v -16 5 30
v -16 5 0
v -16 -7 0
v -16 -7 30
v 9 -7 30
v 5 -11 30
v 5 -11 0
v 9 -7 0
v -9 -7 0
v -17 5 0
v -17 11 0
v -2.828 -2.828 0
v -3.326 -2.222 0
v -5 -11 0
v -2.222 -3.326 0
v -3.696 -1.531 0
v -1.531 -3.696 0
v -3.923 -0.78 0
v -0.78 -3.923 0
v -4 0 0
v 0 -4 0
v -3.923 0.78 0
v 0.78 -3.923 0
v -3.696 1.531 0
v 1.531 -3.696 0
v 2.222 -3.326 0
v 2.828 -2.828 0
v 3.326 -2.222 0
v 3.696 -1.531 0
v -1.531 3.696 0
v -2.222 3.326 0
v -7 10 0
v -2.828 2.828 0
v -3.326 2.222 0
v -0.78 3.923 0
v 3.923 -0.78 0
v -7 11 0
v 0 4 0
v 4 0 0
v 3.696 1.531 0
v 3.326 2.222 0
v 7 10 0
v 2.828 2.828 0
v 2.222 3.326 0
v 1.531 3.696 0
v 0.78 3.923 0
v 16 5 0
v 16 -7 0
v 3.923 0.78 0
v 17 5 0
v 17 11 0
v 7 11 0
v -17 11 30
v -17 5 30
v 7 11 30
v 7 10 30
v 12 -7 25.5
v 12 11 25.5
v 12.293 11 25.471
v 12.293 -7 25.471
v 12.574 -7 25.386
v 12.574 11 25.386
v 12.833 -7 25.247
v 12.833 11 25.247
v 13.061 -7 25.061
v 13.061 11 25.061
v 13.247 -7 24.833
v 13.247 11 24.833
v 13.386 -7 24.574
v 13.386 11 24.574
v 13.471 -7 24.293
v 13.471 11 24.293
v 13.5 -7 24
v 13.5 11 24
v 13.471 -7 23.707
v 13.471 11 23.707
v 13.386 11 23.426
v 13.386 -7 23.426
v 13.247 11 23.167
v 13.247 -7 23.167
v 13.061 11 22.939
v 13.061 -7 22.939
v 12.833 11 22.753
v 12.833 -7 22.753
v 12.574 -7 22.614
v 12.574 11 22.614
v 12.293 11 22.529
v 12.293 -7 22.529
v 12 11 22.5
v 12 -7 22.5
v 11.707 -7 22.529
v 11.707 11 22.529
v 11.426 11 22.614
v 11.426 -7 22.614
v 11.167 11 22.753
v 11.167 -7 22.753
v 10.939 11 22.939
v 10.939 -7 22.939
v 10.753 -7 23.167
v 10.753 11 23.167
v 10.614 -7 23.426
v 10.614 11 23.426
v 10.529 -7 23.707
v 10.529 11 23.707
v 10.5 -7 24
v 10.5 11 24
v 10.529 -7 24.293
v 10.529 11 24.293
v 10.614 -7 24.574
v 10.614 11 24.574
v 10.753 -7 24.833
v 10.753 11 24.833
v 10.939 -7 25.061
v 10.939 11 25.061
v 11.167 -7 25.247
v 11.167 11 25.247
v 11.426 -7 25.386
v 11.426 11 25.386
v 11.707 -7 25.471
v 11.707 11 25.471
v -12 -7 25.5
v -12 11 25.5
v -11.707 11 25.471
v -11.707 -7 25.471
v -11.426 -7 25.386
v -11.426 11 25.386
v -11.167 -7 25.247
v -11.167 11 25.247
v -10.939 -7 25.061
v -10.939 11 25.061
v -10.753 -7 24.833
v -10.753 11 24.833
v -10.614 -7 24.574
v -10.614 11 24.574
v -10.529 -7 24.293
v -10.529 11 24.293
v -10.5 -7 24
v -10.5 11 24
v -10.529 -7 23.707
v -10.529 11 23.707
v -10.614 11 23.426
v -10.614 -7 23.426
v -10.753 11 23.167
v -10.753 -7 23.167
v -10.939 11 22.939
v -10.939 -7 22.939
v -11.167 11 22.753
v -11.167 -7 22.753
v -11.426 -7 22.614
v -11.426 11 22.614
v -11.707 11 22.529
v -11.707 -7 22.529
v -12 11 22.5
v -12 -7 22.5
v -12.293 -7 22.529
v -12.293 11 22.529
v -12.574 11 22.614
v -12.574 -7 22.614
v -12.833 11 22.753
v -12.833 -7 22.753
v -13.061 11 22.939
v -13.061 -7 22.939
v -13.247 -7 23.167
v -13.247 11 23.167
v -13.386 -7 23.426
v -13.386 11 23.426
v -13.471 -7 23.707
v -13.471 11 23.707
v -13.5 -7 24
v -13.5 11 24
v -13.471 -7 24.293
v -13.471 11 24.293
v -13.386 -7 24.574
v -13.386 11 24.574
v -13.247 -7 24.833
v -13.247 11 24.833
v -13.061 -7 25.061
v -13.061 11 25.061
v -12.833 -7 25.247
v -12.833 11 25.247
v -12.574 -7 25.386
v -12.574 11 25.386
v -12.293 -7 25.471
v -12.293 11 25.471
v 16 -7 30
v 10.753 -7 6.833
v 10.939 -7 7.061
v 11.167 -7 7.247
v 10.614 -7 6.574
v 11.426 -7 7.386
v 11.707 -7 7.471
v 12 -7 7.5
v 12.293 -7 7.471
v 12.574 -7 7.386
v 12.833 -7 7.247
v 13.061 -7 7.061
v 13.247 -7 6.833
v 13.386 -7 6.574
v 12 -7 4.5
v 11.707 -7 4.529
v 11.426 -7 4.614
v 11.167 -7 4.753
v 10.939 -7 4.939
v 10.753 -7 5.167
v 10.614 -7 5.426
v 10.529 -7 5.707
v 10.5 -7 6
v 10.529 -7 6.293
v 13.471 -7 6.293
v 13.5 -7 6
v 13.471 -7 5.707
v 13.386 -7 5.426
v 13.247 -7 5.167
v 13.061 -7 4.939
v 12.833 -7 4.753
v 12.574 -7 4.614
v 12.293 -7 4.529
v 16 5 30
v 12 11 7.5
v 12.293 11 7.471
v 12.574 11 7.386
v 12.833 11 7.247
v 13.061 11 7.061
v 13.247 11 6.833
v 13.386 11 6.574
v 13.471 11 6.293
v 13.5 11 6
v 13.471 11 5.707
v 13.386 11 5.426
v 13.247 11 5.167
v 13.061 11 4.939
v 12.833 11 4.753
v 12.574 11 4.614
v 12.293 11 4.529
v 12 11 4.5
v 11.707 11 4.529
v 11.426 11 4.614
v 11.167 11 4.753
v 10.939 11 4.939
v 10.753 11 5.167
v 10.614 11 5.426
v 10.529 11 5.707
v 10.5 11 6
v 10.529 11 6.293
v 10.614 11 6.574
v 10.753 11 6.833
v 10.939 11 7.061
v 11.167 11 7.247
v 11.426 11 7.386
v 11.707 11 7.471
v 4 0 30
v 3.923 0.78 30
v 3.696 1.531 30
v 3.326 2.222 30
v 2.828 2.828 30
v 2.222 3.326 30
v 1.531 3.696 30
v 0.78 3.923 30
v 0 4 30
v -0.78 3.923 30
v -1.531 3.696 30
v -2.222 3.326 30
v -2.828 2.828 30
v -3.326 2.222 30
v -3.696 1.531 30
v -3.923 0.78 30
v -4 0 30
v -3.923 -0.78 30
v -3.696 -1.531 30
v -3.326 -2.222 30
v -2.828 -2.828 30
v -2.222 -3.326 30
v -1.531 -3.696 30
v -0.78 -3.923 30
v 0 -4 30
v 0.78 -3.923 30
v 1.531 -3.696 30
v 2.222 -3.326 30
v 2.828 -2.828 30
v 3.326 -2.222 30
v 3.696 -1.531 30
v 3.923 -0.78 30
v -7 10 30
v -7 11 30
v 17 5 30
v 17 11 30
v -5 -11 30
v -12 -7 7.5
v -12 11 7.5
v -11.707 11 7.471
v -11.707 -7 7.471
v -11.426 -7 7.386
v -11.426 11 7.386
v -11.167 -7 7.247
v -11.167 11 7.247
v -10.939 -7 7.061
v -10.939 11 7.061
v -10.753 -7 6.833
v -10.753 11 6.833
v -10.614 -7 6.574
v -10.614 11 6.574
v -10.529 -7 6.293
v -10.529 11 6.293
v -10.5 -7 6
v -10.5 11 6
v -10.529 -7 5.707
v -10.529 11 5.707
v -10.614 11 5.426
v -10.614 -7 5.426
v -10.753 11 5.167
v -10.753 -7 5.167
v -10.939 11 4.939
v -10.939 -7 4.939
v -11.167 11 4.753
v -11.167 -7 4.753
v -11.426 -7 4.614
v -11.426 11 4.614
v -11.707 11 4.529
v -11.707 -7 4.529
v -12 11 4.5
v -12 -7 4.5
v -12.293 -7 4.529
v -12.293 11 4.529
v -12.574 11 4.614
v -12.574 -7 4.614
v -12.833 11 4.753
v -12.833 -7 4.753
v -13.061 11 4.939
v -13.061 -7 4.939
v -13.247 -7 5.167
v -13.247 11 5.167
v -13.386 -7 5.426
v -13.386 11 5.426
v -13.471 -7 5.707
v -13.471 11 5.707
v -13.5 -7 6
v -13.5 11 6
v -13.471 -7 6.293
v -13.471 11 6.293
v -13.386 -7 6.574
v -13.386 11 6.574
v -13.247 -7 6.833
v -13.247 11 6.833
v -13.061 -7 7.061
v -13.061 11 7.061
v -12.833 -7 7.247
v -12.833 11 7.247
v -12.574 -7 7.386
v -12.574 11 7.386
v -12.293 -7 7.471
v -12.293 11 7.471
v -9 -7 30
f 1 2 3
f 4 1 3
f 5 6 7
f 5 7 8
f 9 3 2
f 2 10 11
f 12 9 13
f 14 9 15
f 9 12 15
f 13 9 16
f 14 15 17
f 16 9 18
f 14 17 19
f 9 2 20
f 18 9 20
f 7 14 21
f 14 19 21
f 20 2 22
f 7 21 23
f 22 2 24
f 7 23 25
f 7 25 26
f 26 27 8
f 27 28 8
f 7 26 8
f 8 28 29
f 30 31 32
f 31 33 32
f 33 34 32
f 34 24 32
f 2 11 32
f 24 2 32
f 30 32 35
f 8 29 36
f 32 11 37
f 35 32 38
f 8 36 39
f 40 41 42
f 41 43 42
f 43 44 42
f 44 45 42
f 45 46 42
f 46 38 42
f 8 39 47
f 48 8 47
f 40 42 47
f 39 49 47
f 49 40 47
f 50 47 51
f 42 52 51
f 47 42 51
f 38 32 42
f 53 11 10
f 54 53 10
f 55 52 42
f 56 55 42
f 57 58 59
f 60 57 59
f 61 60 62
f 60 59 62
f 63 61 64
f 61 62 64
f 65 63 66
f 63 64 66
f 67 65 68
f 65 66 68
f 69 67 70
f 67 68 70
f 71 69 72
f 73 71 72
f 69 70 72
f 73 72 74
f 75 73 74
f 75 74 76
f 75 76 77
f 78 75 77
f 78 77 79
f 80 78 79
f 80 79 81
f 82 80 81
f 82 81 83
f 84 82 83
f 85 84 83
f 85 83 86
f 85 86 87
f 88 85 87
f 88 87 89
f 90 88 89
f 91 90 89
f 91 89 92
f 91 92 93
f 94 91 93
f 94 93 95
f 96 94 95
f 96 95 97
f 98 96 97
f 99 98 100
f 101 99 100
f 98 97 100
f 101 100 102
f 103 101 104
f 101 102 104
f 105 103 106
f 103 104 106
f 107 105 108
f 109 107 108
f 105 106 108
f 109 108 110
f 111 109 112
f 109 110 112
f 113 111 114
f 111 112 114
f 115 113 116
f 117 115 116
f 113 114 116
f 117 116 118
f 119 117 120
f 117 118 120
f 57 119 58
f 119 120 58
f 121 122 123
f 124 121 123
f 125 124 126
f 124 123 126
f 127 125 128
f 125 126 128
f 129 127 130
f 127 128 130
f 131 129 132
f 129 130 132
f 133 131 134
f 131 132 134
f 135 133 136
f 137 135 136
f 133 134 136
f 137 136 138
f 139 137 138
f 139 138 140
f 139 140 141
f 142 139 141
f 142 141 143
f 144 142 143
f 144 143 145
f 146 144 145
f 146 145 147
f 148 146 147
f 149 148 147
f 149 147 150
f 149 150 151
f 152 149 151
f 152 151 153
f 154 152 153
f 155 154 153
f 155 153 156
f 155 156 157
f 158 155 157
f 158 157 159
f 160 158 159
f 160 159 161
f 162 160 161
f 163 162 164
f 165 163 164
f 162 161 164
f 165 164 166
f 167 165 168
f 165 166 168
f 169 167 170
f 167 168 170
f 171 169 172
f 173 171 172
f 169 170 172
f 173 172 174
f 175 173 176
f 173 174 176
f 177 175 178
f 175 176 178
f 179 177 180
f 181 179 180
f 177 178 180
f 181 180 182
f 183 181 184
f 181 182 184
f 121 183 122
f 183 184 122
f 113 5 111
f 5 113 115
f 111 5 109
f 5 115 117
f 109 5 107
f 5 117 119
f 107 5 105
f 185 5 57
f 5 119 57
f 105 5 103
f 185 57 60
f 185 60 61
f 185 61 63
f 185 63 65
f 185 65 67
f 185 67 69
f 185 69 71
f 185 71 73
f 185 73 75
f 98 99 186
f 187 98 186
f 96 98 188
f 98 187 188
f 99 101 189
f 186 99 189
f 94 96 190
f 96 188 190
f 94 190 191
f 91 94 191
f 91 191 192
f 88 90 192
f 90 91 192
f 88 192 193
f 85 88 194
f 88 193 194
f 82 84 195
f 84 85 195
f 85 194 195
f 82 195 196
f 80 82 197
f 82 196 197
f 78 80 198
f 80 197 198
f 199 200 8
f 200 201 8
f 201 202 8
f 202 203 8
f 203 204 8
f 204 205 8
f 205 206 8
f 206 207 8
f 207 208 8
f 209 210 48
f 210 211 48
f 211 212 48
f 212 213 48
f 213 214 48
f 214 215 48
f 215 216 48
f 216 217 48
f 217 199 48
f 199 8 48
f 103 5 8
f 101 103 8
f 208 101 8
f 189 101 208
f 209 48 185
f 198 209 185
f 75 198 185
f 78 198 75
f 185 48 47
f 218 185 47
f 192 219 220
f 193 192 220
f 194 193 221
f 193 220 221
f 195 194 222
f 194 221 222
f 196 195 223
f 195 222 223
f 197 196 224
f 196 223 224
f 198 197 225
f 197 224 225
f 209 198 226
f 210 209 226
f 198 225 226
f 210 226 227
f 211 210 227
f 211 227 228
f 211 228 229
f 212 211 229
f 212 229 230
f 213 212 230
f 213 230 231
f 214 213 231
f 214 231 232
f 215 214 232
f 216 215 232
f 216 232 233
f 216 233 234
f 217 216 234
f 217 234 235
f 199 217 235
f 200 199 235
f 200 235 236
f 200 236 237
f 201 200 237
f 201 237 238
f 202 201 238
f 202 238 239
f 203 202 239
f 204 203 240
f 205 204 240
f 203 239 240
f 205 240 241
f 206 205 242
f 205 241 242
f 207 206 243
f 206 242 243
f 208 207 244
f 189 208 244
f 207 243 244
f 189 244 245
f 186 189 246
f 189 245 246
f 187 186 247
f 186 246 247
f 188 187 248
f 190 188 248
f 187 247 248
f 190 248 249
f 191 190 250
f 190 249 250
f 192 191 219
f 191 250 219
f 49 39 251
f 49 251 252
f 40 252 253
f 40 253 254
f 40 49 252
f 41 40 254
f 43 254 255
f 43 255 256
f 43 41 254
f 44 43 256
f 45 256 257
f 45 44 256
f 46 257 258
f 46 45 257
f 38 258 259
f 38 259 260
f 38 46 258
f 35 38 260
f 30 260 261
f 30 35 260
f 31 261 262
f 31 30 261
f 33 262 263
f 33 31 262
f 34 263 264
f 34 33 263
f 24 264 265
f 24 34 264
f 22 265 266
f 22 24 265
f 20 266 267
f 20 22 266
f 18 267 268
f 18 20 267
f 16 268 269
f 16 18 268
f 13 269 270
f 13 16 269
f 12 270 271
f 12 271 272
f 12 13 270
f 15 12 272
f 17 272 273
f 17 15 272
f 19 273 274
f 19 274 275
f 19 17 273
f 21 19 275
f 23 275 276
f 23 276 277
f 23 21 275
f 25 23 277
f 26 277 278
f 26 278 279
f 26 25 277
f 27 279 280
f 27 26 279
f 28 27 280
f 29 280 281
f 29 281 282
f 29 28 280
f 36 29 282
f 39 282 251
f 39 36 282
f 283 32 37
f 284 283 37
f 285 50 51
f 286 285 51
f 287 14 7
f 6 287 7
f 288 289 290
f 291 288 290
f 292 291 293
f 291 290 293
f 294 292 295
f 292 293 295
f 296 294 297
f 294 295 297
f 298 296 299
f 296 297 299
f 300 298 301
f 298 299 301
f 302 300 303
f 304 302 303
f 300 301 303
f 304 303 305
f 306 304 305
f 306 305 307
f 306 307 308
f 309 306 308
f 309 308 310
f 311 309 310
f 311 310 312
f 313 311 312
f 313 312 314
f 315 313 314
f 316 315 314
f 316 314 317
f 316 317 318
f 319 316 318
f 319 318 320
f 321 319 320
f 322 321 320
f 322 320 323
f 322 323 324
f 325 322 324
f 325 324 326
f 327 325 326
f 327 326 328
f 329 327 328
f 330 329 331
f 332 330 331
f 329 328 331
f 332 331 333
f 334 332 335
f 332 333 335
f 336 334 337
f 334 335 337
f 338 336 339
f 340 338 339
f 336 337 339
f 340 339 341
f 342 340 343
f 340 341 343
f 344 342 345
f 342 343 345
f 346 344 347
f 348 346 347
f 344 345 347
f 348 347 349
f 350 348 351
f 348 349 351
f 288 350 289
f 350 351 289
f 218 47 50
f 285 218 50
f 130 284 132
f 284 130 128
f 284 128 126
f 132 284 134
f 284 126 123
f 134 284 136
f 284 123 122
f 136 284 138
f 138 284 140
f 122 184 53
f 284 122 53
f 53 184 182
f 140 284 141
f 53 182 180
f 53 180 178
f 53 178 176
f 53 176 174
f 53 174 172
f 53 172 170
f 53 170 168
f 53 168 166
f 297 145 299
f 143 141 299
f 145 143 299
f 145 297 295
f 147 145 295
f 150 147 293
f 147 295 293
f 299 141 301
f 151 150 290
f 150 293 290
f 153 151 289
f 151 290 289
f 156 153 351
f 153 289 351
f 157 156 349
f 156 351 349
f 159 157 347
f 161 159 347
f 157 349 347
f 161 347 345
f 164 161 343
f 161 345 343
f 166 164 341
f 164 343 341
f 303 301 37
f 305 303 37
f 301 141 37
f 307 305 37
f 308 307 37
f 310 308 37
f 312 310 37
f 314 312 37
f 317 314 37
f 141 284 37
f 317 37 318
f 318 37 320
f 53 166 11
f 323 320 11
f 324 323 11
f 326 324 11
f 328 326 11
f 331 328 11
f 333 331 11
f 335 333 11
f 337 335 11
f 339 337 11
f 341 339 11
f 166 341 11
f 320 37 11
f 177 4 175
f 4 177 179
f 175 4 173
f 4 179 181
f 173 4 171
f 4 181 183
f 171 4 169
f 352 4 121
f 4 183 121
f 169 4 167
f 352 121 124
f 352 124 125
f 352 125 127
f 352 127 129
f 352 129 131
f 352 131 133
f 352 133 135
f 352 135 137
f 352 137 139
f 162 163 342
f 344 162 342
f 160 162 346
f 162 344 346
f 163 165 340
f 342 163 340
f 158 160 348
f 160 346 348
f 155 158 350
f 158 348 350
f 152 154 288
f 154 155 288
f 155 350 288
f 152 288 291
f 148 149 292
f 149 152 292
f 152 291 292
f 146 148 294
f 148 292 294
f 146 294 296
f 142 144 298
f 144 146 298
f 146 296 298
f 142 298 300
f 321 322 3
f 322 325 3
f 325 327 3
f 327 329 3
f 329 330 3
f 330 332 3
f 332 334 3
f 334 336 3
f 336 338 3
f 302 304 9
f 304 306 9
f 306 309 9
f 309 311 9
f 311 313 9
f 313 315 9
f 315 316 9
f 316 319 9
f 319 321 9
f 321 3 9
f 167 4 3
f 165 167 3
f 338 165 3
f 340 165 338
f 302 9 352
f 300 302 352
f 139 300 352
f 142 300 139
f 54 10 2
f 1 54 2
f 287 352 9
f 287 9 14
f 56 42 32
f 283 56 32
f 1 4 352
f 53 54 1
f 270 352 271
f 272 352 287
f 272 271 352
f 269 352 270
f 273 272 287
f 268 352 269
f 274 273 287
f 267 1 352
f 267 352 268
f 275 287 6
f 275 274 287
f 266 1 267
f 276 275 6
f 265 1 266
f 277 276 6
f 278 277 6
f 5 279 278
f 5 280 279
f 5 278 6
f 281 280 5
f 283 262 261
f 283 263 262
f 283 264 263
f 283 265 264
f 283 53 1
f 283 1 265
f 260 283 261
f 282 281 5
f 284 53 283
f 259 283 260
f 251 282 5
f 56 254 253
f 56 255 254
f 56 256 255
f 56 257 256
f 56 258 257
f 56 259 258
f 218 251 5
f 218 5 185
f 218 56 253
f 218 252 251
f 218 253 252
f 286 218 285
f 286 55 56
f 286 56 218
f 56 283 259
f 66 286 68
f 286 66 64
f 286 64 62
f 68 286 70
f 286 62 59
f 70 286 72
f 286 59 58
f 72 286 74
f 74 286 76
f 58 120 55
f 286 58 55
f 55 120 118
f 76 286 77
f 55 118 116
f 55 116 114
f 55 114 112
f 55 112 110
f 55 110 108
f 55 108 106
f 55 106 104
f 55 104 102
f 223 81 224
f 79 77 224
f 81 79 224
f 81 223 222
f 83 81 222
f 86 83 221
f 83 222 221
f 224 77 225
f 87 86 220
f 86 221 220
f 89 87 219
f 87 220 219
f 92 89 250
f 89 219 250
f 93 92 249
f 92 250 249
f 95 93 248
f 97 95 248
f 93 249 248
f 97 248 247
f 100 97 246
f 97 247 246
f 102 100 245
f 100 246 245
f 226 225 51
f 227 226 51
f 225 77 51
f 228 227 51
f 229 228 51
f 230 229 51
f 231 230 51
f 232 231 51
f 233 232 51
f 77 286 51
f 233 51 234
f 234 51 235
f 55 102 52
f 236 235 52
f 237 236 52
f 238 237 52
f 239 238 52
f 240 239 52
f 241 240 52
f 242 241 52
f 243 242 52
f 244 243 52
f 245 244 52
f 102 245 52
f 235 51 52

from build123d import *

# Parameters (mm, degrees)
SKETCH1_R           = 4
BOSS_EXTRUDE1_DEPTH = 30
SKETCH2_R           = 1.5
CUT_EXTRUDE1_DEPTH  = 30


with BuildPart() as part:
    # Sketch1 → Boss-Extrude1 (new body)
    with BuildSketch(Plane.XY):
        Polygon((-16, -7), (-9, -7), (-5, -11), (5, -11), (9, -7), (16, -7), (16, 5), (17, 5), (17, 11), (7, 11), (7, 10), (-7, 10), (-7, 11), (-17, 11), (-17, 5), (-16, 5), align=None)
        Circle(SKETCH1_R, mode=Mode.SUBTRACT)
    extrude(amount=BOSS_EXTRUDE1_DEPTH)

    # Sketch2 → Cut-Extrude1 (cut)
    with BuildSketch(Plane(origin=(0, 11, 0), x_dir=(-1, 0, 0), z_dir=(0, 1, 0))):
        with Locations(Location((12, 24, 0), (0, 0, 90))):
            Circle(SKETCH2_R)
        with Locations(Location((12, 6, 0), (0, 0, 90))):
            Circle(SKETCH2_R)
        with Locations(Location((-12, 24, 0), (0, 0, 90))):
            Circle(SKETCH2_R)
        with Locations(Location((-12, 6, 0), (0, 0, 90))):
            Circle(SKETCH2_R)
    extrude(amount=-CUT_EXTRUDE1_DEPTH, mode=Mode.SUBTRACT)


solid = part.part
